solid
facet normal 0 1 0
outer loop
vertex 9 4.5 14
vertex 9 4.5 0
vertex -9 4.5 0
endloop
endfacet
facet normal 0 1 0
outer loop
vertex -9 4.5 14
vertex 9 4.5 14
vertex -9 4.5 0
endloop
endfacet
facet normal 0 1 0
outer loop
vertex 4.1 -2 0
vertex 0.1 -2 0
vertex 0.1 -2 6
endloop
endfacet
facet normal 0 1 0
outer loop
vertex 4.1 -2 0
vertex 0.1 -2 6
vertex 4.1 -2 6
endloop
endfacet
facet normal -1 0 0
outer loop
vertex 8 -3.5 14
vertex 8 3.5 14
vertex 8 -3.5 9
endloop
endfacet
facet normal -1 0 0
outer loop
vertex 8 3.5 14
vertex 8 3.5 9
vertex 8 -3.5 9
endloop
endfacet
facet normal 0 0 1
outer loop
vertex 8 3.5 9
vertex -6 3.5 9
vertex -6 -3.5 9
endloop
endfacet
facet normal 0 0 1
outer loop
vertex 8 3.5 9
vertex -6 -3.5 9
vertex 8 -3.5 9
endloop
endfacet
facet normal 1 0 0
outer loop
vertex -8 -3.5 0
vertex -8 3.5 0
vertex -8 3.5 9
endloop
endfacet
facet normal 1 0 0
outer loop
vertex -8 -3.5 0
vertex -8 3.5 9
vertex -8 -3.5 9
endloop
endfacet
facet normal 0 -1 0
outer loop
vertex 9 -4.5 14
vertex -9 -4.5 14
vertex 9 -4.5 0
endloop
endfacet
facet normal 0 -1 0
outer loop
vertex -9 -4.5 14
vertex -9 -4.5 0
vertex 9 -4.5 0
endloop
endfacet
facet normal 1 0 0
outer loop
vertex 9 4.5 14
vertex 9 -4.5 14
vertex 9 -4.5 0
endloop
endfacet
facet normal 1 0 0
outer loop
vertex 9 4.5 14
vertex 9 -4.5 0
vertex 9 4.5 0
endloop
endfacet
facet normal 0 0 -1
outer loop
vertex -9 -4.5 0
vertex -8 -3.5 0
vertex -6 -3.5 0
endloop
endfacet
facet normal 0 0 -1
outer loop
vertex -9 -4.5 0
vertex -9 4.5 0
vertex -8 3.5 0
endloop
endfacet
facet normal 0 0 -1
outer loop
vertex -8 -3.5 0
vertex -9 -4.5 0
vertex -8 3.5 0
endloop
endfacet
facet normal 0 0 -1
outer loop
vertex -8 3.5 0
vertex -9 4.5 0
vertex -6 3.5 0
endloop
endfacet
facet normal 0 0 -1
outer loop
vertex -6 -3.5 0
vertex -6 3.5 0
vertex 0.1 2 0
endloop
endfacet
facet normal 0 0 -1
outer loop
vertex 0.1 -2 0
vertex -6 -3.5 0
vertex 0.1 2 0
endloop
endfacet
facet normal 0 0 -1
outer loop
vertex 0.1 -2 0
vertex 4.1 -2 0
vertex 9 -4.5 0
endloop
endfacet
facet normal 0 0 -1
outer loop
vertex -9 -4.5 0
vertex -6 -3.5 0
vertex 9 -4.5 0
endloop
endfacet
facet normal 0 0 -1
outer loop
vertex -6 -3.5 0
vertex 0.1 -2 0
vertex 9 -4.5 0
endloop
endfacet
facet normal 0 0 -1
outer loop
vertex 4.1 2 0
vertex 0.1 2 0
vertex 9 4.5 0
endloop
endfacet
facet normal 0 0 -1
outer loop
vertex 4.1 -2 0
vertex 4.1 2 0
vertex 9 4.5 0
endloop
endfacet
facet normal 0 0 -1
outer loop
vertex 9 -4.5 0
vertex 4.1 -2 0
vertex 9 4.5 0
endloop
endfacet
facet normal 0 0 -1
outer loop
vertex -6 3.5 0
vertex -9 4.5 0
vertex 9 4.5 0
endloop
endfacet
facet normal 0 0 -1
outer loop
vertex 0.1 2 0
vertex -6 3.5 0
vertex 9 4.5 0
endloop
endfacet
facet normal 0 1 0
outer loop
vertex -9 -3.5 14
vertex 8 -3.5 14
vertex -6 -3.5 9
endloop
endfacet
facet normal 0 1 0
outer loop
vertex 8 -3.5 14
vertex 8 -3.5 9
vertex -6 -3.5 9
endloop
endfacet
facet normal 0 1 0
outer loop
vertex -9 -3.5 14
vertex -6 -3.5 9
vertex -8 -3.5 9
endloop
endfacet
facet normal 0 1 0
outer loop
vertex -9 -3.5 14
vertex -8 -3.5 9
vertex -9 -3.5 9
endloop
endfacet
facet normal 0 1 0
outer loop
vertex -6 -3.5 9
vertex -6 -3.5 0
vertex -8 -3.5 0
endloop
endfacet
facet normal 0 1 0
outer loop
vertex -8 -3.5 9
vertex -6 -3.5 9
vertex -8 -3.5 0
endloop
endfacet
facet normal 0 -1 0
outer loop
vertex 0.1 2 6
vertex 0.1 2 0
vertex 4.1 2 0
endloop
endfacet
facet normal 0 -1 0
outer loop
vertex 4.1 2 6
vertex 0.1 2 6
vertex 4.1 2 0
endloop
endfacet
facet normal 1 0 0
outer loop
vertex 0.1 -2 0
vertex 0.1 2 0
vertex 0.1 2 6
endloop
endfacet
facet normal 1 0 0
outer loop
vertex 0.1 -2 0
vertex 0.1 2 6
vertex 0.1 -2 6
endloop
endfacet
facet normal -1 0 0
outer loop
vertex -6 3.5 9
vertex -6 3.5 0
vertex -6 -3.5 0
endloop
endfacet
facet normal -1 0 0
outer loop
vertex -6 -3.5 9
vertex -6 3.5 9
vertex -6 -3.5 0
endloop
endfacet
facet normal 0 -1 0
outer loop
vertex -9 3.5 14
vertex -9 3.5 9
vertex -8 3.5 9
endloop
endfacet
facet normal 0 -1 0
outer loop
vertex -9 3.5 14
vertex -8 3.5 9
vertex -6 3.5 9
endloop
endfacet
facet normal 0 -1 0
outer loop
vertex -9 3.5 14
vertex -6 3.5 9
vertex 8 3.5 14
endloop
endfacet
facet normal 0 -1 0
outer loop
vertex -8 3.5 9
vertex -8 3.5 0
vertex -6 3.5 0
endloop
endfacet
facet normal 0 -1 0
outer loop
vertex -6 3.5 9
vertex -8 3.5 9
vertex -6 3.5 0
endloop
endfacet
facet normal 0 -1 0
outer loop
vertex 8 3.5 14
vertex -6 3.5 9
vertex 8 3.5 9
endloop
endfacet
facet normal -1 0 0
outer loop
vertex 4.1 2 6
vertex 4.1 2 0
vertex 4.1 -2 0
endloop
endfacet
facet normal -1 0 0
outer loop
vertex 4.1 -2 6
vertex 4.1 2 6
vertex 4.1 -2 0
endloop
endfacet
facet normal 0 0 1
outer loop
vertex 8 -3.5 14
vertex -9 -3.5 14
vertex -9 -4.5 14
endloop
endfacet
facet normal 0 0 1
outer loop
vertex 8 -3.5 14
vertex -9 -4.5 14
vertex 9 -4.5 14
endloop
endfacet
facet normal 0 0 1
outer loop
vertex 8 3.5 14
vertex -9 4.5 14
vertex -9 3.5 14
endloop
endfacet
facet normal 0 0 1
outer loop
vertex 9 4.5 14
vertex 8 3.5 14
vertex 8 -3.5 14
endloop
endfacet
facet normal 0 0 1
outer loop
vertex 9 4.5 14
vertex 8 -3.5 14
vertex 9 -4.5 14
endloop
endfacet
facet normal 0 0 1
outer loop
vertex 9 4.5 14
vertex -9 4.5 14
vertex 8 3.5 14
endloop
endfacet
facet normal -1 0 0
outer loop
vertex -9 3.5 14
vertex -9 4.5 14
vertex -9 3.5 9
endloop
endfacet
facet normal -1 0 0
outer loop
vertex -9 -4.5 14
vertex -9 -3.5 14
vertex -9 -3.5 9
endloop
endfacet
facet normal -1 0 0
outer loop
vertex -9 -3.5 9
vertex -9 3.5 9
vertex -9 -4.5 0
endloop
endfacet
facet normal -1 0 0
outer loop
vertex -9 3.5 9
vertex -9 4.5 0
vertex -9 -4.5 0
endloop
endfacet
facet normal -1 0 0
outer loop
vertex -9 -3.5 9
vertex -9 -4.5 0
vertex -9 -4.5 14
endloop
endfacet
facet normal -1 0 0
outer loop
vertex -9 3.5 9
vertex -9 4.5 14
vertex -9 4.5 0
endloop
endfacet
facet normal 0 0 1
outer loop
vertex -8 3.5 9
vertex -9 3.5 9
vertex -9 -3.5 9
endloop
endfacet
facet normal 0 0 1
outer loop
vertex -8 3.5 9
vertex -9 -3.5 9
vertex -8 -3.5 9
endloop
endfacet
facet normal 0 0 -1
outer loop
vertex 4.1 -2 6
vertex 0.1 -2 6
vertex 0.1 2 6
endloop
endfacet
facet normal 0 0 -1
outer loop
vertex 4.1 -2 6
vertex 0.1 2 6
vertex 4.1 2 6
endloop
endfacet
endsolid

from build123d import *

# Parameters (mm, degrees)
F0_W     = 18
F0_H     = 9
F1_DEPTH = 13
F2_W     = 17
F2_H     = 7
F3_DEPTH = 4
F4_W     = 4
F4_H     = 4
F5_DEPTH = 6
F4_W_2   = 2
F4_H_2   = 7
F6_DEPTH = 9
F8_DEPTH = 1


with BuildPart() as f1:
    # F0 (on Top) → F1 (new body)
    with BuildSketch(Plane.XY):
        Rectangle(F0_W, F0_H)
    extrude(amount=F1_DEPTH)

    # F2 (on face) → F3 (cut)
    with BuildSketch(Plane.XY.offset(13)):
        with Locations((-0.5, 0)):
            Rectangle(F2_W, F2_H)
    extrude(amount=-F3_DEPTH, mode=Mode.SUBTRACT)

    # F4 (on face) → F5 (cut)
    with BuildSketch(Plane(origin=(0, 0, 0), x_dir=(1, 0, 0), z_dir=(0, 0, -1))):
        with Locations((2.1, 0)):
            Rectangle(F4_W, F4_H)
    extrude(amount=-F5_DEPTH, mode=Mode.SUBTRACT)

    # F4 (on face) → F6 (cut)
    with BuildSketch(Plane(origin=(0, 0, 0), x_dir=(1, 0, 0), z_dir=(0, 0, -1))):
        with Locations((-7, 0)):
            Rectangle(F4_W_2, F4_H_2)
    extrude(amount=-F6_DEPTH, mode=Mode.SUBTRACT)

    # F7 (on face) → F8 (join)
    with BuildSketch(Plane.XY.offset(13)):
        Polygon((9, 4.5), (-9, 4.5), (-9, 3.5), (8, 3.5), (8, -3.5), (-9, -3.5), (-9, -4.5), (9, -4.5), align=None)
    extrude(amount=F8_DEPTH)


solid = f1.part
